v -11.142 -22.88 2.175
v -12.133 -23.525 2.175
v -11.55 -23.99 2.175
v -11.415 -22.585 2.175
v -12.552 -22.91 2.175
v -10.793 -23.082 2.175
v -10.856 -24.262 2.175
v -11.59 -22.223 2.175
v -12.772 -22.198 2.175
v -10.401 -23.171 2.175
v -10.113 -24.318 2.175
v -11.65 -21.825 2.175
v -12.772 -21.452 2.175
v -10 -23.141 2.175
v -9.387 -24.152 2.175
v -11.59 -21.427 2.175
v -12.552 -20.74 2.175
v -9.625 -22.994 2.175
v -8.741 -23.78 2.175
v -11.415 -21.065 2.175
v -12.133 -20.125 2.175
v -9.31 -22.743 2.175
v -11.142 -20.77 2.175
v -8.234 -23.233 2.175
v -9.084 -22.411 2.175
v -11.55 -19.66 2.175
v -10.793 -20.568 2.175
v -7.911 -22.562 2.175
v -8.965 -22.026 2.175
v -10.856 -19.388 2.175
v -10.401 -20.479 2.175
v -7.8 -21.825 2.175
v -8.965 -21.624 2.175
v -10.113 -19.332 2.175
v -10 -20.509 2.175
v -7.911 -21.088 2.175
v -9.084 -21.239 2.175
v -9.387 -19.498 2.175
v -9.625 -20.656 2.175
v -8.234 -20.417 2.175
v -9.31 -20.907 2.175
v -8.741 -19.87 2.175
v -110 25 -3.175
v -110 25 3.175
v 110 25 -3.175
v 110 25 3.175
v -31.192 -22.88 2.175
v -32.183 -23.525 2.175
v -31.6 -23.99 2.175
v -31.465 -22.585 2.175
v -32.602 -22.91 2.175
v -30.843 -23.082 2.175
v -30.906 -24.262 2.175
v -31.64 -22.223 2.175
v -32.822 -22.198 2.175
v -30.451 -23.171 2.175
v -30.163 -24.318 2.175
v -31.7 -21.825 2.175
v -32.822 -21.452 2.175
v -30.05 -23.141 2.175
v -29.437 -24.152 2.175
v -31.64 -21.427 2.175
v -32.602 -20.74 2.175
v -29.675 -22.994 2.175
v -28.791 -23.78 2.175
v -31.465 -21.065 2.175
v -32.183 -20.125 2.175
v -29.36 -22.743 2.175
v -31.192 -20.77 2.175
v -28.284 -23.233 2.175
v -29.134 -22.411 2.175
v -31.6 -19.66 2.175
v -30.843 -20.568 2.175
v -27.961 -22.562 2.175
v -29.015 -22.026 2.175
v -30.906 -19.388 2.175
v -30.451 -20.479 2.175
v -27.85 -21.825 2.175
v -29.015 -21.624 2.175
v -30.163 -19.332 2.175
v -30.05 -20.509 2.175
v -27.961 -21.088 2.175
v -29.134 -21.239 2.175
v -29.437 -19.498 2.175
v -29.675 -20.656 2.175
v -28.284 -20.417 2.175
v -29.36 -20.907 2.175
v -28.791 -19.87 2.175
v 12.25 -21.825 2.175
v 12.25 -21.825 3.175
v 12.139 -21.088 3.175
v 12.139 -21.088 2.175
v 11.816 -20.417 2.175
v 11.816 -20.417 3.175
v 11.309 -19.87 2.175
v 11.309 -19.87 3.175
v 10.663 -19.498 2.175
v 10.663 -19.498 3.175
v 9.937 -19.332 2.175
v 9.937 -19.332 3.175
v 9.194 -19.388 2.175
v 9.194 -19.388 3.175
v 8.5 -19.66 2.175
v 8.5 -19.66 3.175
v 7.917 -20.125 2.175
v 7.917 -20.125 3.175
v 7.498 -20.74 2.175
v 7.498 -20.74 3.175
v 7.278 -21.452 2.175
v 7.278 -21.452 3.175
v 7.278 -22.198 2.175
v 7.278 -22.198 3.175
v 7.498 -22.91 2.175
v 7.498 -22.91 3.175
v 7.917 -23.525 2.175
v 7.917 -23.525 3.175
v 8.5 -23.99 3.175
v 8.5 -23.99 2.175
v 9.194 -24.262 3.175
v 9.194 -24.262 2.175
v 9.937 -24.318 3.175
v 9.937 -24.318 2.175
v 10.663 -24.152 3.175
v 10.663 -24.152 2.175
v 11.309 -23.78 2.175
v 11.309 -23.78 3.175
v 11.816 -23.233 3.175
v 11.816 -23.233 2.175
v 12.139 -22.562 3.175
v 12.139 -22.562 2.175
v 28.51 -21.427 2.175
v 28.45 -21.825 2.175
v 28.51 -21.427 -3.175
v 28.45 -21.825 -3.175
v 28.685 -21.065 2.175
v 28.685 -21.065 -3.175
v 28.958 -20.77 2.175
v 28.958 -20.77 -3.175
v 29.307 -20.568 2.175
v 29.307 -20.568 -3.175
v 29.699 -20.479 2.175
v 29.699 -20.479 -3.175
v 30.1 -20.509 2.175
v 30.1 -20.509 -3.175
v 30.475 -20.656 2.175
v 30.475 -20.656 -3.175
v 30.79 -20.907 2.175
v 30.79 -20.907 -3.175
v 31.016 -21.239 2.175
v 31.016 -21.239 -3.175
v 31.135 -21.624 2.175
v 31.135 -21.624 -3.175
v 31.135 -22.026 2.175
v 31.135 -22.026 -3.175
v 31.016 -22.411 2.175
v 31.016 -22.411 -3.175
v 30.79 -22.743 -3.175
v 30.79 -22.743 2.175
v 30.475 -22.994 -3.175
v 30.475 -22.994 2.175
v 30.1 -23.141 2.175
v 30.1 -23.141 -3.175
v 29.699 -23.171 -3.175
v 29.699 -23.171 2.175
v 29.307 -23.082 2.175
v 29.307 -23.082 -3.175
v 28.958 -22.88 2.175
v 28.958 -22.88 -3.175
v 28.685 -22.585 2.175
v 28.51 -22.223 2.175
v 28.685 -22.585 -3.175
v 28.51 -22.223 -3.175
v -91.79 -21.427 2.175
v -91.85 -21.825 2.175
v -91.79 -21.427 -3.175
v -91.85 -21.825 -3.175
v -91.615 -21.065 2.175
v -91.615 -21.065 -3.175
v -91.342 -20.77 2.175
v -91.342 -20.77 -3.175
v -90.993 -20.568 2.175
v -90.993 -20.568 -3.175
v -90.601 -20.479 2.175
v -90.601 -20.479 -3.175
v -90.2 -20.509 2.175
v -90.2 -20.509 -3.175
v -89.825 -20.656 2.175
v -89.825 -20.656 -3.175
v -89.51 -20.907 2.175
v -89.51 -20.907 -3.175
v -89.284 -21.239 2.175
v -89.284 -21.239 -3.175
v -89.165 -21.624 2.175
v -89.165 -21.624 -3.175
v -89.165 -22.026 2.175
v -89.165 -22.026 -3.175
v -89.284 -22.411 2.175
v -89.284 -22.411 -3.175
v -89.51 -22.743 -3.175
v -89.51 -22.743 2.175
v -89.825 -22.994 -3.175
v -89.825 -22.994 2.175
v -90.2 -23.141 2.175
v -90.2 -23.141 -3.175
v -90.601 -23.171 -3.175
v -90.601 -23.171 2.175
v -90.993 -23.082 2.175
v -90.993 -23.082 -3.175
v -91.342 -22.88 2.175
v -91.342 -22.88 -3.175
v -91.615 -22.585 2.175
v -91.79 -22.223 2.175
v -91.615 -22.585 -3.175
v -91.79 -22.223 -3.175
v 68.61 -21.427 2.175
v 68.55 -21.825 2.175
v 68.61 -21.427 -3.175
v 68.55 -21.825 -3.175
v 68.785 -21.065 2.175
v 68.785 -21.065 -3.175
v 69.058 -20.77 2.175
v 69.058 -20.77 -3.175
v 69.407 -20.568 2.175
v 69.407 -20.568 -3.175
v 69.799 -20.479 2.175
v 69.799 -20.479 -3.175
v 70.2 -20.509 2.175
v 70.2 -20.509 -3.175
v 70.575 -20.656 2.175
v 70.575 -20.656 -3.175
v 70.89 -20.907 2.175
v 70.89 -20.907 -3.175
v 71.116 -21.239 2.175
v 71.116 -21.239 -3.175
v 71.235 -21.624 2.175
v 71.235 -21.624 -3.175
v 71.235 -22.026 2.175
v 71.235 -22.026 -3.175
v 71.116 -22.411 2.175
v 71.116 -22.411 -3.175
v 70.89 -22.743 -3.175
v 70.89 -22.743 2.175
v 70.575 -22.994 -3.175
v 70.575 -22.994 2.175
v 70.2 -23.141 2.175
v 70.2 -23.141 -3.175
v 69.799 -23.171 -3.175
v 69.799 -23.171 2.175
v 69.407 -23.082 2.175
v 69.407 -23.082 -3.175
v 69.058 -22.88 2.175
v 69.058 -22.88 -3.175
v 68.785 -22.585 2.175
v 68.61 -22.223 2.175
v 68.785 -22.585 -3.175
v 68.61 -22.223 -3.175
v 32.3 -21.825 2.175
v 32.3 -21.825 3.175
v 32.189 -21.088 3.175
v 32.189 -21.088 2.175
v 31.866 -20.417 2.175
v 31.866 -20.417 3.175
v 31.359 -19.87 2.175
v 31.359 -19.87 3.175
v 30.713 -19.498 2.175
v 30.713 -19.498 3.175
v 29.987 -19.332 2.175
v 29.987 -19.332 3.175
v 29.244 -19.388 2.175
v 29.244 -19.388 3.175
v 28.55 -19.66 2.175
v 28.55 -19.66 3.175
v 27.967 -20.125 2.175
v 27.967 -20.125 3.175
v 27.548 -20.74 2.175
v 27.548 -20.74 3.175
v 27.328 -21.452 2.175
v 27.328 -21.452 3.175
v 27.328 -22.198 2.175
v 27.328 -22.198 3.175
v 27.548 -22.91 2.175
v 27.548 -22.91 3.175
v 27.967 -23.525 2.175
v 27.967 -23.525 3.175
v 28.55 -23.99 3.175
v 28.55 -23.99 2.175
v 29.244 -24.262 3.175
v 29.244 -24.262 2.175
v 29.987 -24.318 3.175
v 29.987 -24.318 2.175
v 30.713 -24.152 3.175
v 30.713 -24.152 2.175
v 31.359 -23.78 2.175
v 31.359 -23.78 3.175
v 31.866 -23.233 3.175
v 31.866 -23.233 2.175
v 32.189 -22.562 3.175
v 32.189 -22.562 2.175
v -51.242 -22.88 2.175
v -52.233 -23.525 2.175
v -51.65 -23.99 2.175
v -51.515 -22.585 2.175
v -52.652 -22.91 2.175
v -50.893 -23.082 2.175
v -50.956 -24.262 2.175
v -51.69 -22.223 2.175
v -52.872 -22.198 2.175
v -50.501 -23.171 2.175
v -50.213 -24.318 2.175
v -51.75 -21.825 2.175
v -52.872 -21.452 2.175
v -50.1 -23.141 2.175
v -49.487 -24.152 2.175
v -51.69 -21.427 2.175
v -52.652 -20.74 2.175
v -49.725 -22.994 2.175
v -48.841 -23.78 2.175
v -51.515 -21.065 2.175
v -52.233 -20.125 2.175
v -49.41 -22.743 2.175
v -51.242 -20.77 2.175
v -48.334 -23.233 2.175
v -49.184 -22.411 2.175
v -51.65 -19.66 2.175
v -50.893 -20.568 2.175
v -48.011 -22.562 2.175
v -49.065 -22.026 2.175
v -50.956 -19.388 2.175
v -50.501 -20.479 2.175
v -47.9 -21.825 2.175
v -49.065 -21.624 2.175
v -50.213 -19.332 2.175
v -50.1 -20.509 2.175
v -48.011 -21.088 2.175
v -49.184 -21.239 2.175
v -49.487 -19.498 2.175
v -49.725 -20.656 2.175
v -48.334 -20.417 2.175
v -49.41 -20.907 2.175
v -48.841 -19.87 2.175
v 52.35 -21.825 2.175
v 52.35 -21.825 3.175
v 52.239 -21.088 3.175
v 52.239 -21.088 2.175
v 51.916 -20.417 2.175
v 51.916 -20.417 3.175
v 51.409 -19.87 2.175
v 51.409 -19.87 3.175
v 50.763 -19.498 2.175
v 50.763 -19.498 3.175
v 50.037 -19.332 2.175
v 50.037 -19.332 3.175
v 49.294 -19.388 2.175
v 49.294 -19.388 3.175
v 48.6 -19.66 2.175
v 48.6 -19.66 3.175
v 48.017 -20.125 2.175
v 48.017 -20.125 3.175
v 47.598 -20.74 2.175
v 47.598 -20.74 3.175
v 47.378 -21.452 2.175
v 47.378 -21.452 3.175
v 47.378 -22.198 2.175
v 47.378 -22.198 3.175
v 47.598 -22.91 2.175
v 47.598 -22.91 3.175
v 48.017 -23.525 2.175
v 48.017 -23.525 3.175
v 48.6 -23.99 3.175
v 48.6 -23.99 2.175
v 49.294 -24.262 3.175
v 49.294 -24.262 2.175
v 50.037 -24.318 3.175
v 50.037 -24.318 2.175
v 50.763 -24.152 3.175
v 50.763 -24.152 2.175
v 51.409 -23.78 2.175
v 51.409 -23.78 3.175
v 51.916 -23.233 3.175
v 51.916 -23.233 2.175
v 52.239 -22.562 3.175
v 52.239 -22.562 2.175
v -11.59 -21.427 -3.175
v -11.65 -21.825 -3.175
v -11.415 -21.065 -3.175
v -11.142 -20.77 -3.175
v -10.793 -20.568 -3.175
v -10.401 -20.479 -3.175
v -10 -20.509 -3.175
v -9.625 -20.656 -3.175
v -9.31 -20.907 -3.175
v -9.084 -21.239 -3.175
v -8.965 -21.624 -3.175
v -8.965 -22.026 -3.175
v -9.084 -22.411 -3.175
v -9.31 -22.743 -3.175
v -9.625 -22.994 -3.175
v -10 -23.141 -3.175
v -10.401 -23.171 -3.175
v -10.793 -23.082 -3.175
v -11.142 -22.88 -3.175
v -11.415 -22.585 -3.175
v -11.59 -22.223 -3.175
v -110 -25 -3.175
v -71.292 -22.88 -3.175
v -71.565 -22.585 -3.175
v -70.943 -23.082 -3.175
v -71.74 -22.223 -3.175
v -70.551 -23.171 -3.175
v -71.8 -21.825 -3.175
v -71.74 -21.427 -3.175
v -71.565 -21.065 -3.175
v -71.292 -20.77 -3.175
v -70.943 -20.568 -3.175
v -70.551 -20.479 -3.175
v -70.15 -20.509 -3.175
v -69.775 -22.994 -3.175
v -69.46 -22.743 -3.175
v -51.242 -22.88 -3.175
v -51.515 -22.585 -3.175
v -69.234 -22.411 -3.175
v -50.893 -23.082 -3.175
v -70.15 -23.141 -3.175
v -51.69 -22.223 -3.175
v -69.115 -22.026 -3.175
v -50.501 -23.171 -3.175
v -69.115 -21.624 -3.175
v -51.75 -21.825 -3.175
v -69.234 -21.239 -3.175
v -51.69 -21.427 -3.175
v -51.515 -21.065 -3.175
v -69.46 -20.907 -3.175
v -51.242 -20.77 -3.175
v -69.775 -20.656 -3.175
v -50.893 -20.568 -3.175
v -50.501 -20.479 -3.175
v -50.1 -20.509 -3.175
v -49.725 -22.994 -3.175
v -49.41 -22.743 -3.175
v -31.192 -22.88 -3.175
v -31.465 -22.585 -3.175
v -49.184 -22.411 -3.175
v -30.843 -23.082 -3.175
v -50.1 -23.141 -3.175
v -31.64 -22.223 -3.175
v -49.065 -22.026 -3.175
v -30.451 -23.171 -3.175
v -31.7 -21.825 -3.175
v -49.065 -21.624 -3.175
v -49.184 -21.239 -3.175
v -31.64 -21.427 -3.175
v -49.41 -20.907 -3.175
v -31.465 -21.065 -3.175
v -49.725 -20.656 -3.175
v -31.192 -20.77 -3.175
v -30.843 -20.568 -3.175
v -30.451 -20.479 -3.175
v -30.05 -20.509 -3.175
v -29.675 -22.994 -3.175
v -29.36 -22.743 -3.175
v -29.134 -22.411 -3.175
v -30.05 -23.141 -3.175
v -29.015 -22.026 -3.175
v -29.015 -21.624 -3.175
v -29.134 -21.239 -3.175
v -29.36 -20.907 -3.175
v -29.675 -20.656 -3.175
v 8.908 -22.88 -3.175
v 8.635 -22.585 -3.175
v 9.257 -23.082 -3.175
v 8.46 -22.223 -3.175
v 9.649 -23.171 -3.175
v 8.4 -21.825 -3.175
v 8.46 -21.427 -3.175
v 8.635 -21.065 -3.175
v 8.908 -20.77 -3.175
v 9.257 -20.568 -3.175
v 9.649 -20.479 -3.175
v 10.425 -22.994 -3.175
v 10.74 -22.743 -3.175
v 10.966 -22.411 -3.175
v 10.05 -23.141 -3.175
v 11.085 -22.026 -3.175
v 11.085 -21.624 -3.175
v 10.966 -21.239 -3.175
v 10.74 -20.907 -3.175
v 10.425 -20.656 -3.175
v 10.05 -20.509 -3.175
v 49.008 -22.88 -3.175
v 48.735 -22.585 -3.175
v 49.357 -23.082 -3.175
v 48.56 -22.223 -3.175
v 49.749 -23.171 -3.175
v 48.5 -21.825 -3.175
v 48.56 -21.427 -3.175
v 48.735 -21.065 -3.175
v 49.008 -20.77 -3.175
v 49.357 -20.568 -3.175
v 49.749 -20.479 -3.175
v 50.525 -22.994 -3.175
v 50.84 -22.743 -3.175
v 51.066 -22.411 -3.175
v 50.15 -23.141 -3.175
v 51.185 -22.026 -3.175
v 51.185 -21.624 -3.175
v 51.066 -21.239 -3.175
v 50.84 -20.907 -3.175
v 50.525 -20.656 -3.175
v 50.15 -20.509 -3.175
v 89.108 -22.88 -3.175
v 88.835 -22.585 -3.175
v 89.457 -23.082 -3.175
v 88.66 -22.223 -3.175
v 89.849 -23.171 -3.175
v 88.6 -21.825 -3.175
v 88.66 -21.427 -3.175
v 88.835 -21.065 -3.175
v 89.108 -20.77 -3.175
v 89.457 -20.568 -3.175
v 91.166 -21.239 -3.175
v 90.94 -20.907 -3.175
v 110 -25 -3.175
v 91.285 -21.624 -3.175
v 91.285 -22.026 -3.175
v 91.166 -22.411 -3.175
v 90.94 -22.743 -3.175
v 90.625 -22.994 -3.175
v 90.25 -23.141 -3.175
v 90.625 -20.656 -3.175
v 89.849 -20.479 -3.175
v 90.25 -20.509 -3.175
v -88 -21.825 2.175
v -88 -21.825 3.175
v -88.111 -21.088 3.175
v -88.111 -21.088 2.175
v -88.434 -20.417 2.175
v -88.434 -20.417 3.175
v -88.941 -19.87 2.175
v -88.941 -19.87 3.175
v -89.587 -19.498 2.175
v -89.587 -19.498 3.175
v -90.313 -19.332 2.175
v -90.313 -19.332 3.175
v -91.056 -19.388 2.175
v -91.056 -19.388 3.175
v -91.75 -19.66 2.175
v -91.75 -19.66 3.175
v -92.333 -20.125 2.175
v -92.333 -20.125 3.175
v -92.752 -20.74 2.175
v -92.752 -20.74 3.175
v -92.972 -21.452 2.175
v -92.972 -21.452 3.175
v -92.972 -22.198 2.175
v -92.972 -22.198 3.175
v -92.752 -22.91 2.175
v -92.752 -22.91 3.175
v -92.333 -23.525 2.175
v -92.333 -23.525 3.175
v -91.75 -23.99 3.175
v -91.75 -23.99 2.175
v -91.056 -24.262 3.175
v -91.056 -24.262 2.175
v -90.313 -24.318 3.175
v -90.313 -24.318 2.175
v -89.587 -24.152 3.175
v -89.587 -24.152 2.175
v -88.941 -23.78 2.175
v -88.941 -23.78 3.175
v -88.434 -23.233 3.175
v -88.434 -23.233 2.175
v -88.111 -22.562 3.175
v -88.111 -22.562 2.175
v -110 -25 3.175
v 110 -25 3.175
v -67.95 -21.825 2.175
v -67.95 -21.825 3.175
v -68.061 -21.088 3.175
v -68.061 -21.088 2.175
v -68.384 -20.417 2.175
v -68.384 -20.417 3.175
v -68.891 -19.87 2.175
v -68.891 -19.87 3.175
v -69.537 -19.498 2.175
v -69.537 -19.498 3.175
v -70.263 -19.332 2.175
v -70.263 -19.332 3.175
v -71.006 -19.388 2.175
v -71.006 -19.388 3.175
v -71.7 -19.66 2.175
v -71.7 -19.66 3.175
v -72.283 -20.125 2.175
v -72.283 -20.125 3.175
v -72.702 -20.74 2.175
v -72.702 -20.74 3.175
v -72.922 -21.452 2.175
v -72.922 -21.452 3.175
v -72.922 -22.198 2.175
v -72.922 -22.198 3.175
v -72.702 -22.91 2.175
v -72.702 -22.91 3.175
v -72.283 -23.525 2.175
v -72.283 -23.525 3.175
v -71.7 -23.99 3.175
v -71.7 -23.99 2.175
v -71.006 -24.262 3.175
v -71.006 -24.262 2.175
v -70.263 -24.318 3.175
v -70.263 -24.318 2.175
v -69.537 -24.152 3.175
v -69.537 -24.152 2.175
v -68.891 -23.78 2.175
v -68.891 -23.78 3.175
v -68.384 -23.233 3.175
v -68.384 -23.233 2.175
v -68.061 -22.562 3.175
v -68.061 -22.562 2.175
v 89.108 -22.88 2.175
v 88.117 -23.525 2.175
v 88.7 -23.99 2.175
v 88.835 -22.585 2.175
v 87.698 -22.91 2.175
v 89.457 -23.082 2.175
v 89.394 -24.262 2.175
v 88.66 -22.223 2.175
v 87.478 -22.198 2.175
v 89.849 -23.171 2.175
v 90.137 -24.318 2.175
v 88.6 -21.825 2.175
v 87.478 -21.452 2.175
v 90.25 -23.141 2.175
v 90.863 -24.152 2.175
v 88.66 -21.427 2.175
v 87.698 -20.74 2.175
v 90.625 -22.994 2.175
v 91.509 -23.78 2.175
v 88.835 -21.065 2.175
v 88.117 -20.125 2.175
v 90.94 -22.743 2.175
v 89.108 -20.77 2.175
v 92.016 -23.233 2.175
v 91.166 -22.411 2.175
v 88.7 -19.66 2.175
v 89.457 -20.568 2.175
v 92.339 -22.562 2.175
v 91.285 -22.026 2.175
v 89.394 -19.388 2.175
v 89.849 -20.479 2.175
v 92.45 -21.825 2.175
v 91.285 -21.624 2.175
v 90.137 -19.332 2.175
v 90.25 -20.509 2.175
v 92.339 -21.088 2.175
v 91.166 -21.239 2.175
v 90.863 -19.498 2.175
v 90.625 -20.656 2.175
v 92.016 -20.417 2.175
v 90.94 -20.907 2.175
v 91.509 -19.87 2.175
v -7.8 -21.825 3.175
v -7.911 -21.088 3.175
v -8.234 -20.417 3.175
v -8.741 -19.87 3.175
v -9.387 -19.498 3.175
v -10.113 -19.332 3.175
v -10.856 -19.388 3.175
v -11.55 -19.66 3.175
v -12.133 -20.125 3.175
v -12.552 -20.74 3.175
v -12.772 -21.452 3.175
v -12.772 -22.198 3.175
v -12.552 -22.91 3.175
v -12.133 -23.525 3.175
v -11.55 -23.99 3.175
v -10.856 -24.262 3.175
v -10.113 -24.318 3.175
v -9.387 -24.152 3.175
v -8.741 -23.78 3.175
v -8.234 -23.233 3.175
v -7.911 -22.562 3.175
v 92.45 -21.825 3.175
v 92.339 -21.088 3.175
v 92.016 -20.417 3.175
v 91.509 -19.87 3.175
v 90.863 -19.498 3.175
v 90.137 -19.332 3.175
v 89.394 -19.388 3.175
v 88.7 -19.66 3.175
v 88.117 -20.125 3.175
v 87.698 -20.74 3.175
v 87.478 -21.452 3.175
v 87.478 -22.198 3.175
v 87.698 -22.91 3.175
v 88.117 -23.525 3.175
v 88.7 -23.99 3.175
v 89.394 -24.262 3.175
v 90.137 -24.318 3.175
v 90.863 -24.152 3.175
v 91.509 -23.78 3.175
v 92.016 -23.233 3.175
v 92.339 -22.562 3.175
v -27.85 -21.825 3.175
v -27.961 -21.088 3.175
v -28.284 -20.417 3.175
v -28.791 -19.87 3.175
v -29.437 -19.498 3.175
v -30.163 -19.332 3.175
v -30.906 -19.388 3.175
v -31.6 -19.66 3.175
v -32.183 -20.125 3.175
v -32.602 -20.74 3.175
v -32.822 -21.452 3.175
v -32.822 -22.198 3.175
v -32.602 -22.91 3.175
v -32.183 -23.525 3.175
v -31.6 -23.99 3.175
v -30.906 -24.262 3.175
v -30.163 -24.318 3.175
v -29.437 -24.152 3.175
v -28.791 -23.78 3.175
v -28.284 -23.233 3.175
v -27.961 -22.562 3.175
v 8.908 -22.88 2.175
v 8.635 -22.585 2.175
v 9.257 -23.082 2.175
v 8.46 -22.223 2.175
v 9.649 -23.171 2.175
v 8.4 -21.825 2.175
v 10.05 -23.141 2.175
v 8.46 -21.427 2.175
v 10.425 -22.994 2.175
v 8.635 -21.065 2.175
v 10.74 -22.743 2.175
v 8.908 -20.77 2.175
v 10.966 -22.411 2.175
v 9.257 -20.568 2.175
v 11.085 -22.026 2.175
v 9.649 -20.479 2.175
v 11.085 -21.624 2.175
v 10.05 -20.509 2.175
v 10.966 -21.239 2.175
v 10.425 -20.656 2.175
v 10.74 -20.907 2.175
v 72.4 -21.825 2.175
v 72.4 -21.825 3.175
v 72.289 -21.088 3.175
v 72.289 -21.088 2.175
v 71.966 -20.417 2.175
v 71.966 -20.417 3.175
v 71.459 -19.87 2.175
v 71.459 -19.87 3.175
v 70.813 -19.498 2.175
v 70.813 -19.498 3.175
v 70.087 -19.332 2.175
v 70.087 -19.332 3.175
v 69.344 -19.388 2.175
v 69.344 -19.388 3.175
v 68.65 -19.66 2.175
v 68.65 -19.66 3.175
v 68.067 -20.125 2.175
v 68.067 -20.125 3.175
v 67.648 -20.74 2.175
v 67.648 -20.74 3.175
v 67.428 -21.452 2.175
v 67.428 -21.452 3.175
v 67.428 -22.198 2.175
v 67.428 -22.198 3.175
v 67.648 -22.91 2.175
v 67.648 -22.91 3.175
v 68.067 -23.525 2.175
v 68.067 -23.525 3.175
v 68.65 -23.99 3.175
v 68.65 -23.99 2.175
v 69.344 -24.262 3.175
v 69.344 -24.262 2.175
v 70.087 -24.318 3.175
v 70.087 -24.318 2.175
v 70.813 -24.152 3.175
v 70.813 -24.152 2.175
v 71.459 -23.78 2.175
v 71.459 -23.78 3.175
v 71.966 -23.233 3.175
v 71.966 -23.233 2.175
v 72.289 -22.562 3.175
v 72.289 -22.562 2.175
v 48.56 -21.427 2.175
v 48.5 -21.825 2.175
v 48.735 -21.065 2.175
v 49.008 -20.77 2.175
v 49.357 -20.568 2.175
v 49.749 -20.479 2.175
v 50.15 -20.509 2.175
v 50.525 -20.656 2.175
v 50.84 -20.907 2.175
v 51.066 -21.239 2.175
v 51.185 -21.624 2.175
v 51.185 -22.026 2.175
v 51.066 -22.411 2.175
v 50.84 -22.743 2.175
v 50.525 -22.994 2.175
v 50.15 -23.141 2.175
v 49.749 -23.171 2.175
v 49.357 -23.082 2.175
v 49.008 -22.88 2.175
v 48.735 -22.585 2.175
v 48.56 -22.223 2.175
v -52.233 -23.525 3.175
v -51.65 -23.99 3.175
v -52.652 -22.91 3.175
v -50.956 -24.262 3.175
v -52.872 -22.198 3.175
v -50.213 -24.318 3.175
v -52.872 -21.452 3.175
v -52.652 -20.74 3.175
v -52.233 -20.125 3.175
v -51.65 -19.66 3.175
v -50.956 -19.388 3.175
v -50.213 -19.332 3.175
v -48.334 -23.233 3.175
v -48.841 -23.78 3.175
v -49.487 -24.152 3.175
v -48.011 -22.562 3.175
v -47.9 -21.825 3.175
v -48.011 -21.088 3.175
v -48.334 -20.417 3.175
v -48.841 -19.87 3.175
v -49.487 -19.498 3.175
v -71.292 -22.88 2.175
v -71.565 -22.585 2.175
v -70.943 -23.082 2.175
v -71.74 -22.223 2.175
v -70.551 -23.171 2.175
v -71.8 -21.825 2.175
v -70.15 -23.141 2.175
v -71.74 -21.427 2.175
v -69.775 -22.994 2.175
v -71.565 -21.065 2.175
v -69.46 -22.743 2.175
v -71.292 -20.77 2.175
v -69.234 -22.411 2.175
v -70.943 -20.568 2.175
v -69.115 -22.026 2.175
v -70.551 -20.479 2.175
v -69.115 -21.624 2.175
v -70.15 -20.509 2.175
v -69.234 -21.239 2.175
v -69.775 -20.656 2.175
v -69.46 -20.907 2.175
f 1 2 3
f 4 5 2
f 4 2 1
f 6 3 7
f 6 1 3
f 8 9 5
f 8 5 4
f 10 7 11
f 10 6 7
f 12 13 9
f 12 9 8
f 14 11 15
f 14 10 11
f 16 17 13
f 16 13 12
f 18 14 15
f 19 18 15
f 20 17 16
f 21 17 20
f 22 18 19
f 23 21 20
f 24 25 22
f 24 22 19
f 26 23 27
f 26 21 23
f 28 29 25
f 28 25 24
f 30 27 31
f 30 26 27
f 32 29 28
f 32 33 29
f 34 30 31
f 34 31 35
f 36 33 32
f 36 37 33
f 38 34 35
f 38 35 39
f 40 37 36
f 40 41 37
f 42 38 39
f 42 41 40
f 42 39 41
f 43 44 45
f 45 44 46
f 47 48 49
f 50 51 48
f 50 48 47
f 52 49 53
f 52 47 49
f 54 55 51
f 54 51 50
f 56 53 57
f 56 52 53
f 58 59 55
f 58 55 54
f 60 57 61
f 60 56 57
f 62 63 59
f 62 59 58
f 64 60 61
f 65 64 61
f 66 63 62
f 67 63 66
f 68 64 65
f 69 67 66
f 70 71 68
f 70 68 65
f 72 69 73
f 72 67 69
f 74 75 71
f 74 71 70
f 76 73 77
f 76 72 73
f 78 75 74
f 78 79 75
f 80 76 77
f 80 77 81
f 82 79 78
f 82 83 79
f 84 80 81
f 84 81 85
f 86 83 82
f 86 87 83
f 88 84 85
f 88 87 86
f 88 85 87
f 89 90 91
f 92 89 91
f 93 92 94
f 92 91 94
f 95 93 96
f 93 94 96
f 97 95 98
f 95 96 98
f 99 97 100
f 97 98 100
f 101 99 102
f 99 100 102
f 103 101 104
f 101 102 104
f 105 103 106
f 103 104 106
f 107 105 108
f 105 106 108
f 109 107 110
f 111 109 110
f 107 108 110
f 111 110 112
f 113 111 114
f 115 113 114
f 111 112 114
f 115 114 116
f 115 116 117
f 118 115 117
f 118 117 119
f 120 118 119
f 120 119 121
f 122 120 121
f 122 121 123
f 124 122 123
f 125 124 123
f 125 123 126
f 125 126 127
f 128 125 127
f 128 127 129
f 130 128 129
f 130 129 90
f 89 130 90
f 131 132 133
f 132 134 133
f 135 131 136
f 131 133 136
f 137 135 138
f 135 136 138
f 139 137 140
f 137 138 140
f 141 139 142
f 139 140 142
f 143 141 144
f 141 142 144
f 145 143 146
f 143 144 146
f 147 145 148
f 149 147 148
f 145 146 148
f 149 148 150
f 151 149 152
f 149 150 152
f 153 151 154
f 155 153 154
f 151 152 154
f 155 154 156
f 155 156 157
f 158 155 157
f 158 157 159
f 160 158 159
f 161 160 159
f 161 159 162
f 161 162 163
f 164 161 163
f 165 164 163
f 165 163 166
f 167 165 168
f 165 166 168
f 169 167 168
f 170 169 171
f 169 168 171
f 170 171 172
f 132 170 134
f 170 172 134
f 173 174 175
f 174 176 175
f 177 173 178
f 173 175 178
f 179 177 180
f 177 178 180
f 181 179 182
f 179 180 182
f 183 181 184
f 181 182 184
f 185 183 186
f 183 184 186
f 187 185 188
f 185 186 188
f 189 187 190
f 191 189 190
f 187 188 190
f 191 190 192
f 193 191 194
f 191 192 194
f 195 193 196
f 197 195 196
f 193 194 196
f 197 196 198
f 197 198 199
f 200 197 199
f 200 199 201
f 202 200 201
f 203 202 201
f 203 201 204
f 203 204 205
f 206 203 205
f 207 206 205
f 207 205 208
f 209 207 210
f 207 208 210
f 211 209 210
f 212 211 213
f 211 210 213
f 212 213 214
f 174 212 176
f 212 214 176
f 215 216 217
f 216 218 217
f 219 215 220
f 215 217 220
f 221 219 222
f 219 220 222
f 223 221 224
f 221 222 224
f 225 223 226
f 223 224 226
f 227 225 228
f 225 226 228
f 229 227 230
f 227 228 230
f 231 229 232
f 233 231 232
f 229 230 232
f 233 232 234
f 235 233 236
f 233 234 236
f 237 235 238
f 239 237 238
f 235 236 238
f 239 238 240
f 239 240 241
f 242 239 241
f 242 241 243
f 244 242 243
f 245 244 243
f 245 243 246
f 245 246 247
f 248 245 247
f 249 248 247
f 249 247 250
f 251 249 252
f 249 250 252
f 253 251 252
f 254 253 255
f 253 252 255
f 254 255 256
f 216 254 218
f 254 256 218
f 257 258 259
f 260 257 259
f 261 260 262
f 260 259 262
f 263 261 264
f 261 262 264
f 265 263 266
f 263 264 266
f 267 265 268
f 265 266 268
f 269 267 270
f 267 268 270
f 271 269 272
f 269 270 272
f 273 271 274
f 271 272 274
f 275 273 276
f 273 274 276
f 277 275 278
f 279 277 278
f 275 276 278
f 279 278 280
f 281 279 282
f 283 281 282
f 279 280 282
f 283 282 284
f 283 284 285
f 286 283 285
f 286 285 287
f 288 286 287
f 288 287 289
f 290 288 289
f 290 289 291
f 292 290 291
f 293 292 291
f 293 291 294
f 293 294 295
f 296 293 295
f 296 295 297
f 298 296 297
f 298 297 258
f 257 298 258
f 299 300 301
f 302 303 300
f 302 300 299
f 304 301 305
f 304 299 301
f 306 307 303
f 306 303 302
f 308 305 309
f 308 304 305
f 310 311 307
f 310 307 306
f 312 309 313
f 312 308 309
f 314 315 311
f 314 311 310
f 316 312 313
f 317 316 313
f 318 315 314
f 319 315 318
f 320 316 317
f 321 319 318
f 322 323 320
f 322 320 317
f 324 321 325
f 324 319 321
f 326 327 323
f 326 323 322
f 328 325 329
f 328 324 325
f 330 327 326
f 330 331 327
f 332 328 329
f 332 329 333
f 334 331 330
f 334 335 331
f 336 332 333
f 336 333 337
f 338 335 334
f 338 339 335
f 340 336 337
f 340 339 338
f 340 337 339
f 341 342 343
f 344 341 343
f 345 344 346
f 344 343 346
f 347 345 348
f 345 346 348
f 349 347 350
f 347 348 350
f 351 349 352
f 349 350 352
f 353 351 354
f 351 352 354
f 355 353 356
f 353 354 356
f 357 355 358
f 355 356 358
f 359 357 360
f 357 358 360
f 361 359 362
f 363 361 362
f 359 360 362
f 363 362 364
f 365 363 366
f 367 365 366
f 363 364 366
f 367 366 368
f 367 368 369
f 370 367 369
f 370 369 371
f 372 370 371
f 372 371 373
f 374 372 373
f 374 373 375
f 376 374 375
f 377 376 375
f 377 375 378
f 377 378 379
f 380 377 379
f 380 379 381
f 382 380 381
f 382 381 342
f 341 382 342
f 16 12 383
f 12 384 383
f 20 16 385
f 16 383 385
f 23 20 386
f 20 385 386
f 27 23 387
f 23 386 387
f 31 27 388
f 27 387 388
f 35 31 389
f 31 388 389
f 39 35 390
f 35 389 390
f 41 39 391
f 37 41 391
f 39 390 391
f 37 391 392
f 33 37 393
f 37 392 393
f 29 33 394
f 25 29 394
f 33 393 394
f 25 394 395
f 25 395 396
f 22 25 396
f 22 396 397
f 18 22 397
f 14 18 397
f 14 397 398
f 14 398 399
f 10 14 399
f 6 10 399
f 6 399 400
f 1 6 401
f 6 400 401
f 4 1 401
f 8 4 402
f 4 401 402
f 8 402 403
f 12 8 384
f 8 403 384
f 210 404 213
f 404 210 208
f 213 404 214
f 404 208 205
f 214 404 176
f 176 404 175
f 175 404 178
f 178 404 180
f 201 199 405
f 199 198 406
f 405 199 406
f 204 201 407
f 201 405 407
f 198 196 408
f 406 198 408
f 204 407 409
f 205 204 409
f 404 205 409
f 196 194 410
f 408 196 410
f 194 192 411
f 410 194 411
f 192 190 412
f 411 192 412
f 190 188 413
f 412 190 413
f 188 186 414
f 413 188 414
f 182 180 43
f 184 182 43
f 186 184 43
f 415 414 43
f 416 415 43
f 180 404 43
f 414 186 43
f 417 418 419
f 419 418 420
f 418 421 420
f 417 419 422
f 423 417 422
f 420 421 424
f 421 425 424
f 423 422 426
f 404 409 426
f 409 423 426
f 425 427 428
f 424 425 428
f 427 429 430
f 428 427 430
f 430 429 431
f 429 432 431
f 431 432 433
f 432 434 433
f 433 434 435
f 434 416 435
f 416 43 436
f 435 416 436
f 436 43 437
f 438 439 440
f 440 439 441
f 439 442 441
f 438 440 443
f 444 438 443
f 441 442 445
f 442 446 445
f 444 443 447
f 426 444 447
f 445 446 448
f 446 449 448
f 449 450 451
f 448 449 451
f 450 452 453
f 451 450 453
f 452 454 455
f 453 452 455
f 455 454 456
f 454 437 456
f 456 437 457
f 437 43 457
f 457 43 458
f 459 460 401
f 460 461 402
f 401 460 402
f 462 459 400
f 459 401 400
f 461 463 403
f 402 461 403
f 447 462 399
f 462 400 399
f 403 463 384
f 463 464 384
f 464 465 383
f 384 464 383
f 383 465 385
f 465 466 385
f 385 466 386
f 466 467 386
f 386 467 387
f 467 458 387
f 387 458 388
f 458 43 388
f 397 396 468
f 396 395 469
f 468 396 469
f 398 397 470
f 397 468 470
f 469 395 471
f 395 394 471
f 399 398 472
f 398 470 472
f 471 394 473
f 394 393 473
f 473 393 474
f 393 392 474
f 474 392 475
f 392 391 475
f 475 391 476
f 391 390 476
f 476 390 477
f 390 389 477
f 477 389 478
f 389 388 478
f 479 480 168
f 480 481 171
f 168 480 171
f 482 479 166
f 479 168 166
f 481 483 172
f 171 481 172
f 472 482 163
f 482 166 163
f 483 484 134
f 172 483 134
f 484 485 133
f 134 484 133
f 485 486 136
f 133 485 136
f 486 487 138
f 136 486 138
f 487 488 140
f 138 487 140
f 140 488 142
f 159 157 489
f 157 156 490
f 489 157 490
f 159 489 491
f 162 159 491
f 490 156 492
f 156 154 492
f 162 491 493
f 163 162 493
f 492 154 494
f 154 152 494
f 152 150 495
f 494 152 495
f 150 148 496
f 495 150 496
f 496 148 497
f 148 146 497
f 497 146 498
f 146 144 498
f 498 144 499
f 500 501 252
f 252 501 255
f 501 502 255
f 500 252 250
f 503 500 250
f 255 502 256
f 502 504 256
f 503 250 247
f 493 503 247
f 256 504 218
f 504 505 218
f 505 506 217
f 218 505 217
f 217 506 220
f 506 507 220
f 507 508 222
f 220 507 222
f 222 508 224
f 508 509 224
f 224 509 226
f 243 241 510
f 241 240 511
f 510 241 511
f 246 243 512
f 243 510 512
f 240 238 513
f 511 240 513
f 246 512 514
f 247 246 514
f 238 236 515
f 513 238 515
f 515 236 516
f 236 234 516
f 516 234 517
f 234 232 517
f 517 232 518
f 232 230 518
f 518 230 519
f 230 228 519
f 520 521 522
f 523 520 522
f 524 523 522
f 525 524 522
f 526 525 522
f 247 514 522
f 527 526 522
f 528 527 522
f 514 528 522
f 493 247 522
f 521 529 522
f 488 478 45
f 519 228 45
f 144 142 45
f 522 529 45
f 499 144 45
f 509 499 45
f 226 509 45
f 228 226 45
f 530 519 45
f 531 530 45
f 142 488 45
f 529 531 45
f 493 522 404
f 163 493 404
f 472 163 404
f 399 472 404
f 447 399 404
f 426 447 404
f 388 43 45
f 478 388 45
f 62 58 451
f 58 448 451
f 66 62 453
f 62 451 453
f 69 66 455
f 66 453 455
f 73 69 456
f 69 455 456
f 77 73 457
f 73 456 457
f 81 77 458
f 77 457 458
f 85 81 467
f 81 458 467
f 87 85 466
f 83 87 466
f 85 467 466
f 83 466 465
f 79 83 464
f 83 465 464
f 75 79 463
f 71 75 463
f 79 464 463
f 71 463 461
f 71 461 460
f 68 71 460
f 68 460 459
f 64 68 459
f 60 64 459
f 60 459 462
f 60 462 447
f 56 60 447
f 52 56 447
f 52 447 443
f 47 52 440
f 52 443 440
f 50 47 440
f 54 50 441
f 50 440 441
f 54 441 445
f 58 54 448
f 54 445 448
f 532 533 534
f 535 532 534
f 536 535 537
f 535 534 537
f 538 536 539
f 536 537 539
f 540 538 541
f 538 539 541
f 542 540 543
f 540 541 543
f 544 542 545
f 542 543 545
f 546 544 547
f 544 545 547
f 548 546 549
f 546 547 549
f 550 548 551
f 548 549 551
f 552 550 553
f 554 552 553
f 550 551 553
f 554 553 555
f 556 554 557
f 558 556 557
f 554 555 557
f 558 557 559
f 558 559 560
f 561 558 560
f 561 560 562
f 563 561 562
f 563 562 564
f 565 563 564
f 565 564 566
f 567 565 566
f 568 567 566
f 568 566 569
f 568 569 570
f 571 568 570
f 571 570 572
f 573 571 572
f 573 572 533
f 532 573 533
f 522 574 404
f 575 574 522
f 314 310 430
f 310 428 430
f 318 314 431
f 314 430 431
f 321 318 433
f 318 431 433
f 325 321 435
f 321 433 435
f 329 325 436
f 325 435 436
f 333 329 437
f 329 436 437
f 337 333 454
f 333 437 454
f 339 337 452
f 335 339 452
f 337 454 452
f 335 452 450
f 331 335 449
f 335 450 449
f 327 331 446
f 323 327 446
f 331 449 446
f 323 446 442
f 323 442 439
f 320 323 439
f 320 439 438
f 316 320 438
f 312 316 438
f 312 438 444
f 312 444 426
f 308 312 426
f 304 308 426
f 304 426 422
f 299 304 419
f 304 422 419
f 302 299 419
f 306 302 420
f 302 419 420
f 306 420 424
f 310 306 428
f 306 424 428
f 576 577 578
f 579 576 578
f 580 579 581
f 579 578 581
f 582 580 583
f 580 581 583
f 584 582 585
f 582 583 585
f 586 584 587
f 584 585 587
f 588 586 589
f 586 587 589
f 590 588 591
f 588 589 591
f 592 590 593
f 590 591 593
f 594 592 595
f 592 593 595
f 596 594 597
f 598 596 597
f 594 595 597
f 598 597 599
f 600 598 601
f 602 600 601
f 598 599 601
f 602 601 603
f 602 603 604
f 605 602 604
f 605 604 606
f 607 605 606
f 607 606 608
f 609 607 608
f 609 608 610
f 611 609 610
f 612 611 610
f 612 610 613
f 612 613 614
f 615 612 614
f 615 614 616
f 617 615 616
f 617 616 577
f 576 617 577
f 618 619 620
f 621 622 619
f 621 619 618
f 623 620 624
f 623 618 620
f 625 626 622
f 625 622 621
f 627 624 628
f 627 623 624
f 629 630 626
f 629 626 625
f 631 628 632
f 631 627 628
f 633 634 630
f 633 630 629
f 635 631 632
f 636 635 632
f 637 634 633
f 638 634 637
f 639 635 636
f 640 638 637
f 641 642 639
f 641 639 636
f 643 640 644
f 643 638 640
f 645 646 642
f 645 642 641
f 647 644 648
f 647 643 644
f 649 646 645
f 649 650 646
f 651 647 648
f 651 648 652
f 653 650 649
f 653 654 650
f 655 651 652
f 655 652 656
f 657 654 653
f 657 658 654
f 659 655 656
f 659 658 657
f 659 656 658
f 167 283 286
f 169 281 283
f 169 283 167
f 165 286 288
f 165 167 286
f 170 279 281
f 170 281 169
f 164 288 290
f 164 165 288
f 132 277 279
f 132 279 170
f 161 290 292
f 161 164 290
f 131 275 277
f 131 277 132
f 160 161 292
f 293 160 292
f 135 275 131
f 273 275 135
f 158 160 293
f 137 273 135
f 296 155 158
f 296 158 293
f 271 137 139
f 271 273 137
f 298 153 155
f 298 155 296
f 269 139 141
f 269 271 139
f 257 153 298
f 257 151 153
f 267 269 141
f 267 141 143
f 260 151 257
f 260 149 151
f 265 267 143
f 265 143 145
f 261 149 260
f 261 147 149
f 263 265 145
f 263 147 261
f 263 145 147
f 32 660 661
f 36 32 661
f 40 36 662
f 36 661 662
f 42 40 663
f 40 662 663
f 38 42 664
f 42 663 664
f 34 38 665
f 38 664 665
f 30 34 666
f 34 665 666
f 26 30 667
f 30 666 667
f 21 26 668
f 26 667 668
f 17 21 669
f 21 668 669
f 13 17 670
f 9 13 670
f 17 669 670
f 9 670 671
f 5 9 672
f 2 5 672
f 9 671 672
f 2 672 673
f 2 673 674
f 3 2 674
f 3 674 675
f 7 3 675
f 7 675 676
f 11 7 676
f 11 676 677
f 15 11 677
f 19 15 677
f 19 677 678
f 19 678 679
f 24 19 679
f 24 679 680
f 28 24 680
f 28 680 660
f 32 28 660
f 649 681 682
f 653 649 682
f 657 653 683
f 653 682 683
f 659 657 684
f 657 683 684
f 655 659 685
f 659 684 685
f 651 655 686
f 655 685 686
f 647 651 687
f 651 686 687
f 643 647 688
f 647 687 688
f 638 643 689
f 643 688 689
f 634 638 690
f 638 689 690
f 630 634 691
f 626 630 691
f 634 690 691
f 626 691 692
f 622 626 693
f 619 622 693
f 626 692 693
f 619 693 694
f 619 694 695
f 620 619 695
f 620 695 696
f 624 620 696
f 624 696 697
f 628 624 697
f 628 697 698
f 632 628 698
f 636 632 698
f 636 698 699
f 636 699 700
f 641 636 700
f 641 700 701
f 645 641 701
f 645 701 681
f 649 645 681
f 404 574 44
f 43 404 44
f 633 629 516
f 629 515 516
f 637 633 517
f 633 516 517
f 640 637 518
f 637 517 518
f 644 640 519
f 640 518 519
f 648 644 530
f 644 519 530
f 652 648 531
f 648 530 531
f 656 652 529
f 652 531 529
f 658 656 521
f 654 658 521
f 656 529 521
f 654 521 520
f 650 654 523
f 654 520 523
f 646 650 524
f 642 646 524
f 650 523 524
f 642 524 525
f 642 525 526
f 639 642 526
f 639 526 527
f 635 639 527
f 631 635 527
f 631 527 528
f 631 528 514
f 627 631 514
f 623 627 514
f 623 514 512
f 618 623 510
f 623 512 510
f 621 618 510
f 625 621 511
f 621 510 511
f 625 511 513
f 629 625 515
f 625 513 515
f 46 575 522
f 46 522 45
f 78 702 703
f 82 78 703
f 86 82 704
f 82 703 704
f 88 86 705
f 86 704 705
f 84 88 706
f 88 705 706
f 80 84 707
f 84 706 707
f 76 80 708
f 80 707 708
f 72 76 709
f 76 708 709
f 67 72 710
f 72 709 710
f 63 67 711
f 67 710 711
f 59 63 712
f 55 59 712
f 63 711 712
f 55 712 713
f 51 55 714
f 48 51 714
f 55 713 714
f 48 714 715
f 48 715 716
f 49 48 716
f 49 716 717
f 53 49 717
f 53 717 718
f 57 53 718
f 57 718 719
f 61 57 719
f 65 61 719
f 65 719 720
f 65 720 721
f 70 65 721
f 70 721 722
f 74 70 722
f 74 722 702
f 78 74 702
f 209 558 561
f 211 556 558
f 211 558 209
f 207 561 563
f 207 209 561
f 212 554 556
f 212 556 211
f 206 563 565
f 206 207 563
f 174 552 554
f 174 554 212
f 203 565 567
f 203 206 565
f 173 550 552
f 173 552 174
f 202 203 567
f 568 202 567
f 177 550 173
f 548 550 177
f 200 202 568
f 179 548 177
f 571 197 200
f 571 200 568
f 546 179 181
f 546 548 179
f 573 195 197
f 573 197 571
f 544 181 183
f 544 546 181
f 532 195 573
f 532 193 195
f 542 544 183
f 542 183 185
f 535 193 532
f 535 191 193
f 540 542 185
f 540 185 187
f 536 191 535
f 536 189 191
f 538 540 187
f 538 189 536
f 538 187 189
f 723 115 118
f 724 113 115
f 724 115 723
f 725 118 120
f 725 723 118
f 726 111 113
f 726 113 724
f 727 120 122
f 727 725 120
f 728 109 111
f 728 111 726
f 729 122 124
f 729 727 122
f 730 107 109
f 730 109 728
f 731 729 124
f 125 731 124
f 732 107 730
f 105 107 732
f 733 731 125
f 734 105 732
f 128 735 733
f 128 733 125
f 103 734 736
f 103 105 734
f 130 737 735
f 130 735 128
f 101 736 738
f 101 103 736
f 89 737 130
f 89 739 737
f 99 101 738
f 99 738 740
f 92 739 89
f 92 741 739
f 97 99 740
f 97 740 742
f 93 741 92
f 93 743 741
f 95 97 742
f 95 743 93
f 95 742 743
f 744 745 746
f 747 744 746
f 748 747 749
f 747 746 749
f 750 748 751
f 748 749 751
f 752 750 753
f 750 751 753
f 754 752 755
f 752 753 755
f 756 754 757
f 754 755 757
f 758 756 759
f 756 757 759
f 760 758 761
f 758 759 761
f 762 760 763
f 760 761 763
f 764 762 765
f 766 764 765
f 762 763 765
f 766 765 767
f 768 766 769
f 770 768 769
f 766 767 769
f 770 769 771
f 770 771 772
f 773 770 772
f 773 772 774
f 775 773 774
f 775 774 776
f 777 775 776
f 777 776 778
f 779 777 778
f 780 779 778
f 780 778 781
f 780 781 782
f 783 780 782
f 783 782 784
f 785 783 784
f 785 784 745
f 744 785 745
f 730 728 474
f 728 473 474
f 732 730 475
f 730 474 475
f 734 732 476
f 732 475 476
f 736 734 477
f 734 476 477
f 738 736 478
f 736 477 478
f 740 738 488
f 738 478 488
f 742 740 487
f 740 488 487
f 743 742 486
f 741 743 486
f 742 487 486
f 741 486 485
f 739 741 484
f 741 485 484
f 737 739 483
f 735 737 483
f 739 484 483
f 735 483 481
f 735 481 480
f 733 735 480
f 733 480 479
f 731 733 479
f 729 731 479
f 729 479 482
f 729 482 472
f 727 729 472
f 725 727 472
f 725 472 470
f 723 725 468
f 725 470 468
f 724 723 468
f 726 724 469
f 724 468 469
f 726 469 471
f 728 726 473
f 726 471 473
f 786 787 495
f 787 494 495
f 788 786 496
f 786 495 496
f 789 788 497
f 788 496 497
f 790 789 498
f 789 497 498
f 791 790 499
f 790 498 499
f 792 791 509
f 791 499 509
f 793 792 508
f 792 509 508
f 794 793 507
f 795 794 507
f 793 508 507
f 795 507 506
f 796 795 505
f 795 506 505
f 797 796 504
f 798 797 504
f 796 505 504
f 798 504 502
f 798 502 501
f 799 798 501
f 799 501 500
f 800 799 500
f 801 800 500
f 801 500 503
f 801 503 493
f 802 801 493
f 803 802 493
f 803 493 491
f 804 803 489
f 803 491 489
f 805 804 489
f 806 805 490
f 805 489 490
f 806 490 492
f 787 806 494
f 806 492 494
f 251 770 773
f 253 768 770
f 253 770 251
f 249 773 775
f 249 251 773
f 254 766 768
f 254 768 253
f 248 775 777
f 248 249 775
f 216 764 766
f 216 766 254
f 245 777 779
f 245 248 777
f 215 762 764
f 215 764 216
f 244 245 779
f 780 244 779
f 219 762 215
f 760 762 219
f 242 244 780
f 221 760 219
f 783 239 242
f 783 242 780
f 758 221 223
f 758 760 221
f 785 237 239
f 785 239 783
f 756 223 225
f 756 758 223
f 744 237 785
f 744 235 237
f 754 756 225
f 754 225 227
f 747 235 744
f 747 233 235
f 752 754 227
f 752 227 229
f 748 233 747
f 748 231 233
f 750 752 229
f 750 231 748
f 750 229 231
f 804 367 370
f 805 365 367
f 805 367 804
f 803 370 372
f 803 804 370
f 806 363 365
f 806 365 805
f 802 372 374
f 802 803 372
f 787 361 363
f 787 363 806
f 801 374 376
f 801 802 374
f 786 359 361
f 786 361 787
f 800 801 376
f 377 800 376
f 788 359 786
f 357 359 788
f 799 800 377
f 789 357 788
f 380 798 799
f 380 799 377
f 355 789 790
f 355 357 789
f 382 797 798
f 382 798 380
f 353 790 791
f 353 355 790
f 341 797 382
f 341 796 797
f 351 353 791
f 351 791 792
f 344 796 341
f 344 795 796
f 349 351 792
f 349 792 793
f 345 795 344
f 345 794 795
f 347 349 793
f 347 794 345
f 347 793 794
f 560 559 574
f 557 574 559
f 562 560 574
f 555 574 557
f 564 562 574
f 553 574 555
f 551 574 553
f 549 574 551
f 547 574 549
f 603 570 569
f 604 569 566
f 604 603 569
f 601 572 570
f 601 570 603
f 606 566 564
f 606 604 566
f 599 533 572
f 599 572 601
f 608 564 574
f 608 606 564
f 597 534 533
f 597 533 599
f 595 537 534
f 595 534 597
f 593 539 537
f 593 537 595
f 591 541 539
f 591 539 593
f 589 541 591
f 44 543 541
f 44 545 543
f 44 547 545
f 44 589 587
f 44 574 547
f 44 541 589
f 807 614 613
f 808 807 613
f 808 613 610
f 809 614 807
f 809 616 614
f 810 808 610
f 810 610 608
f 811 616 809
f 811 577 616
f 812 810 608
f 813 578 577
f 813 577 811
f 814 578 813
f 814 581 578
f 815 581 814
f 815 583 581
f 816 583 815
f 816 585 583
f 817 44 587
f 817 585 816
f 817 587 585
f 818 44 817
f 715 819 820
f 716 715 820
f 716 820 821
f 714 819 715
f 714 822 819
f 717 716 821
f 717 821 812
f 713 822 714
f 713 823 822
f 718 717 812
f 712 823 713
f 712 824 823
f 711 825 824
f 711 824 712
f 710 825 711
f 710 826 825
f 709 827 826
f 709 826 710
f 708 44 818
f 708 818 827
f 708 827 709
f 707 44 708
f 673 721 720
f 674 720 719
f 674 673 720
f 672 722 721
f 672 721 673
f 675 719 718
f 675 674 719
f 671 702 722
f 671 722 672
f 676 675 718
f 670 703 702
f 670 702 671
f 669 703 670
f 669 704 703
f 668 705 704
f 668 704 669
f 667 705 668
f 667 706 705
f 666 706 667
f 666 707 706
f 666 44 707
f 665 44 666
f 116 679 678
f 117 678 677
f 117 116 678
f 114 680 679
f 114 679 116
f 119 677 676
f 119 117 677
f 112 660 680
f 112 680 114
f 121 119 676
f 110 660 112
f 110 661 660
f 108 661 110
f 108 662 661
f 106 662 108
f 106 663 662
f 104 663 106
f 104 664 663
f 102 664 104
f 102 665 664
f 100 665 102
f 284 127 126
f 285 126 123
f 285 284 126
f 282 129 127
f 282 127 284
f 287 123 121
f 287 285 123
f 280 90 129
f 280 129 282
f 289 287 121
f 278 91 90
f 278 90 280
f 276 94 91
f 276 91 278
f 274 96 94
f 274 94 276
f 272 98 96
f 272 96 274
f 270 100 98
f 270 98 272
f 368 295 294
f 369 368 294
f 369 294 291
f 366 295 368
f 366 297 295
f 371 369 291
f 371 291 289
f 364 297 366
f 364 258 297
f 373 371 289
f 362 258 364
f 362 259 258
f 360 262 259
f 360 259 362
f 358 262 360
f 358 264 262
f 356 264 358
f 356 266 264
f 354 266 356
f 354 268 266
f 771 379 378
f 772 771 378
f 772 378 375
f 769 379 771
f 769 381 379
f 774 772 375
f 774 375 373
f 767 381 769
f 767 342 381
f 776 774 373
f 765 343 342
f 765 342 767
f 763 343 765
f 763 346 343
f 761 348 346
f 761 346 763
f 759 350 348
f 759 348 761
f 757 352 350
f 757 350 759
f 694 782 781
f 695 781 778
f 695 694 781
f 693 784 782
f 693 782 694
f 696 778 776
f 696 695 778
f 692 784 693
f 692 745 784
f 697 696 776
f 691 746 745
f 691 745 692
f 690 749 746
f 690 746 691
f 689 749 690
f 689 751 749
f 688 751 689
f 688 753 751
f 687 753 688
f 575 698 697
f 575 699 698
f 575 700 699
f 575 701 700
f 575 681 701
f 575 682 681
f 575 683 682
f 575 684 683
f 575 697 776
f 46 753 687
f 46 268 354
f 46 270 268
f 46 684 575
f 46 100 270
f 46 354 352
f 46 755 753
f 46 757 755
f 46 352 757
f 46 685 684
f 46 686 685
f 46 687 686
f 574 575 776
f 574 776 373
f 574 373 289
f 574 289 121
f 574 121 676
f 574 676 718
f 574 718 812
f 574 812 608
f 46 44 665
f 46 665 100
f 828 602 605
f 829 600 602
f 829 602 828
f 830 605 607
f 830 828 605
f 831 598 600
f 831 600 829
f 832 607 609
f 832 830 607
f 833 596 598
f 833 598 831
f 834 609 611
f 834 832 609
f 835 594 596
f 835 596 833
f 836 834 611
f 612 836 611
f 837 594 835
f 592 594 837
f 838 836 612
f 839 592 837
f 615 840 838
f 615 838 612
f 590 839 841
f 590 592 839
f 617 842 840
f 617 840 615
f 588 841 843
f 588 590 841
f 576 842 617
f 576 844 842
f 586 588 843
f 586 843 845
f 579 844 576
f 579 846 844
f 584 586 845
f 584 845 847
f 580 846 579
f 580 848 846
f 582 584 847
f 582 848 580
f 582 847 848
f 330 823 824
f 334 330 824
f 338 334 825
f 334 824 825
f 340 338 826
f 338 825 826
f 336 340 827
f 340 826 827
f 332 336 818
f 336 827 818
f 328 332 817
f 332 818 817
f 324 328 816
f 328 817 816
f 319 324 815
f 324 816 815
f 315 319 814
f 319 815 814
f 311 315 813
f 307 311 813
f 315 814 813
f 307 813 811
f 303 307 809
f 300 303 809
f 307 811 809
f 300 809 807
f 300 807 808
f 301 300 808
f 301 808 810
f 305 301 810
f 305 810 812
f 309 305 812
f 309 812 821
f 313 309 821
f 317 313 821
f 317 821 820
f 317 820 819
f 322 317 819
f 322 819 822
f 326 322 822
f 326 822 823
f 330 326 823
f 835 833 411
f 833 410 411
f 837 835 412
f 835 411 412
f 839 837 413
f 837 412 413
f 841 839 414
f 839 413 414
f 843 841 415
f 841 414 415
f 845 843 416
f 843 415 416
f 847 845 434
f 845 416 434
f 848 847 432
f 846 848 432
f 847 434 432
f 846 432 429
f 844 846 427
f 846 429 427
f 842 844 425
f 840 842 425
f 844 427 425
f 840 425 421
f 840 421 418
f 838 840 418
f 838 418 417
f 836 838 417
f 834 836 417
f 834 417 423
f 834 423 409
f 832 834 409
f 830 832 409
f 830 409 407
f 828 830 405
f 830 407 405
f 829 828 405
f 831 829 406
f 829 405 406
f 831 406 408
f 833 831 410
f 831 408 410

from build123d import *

# Parameters (mm, degrees)
SKETCH1_W                        = 220
SKETCH1_H                        = 50
BOSS_EXTRUDE1_DEPTH              = 3.175
CBORE_FOR_M2_5_SHCS1_D           = 2.7
CBORE_FOR_M2_5_SHCS1_DEPTH       = 15
CBORE_FOR_M2_5_SHCS1_CBORE_D     = 5
CBORE_FOR_M2_5_SHCS1_CBORE_DEPTH = 1
CBORE_FOR_M2_5_SHCS1_TIP         = 0.811161836


with BuildPart() as part:
    # Sketch1 → Boss-Extrude1 (new, symmetric)
    with BuildSketch(Plane.XY):
        Rectangle(SKETCH1_W, SKETCH1_H)
    extrude(amount=BOSS_EXTRUDE1_DEPTH, both=True)

    # CBORE for M2.5 SHCS1
    with Locations(Plane.XY.offset(3.175)):
        with Locations((89.95, -21.825), (69.9, -21.825), (49.85, -21.825), (29.8, -21.825), (9.75, -21.825), (-10.3, -21.825), (-30.35, -21.825), (-50.4, -21.825), (-70.45, -21.825), (-90.5, -21.825)):
            CounterBoreHole(CBORE_FOR_M2_5_SHCS1_D / 2, CBORE_FOR_M2_5_SHCS1_CBORE_D / 2, CBORE_FOR_M2_5_SHCS1_CBORE_DEPTH, depth=CBORE_FOR_M2_5_SHCS1_DEPTH)
            with Locations((0, 0, -(CBORE_FOR_M2_5_SHCS1_DEPTH + CBORE_FOR_M2_5_SHCS1_TIP / 2))):  # 118° drill point
                Cone(0, CBORE_FOR_M2_5_SHCS1_D / 2, CBORE_FOR_M2_5_SHCS1_TIP, mode=Mode.SUBTRACT)


solid = part.part
